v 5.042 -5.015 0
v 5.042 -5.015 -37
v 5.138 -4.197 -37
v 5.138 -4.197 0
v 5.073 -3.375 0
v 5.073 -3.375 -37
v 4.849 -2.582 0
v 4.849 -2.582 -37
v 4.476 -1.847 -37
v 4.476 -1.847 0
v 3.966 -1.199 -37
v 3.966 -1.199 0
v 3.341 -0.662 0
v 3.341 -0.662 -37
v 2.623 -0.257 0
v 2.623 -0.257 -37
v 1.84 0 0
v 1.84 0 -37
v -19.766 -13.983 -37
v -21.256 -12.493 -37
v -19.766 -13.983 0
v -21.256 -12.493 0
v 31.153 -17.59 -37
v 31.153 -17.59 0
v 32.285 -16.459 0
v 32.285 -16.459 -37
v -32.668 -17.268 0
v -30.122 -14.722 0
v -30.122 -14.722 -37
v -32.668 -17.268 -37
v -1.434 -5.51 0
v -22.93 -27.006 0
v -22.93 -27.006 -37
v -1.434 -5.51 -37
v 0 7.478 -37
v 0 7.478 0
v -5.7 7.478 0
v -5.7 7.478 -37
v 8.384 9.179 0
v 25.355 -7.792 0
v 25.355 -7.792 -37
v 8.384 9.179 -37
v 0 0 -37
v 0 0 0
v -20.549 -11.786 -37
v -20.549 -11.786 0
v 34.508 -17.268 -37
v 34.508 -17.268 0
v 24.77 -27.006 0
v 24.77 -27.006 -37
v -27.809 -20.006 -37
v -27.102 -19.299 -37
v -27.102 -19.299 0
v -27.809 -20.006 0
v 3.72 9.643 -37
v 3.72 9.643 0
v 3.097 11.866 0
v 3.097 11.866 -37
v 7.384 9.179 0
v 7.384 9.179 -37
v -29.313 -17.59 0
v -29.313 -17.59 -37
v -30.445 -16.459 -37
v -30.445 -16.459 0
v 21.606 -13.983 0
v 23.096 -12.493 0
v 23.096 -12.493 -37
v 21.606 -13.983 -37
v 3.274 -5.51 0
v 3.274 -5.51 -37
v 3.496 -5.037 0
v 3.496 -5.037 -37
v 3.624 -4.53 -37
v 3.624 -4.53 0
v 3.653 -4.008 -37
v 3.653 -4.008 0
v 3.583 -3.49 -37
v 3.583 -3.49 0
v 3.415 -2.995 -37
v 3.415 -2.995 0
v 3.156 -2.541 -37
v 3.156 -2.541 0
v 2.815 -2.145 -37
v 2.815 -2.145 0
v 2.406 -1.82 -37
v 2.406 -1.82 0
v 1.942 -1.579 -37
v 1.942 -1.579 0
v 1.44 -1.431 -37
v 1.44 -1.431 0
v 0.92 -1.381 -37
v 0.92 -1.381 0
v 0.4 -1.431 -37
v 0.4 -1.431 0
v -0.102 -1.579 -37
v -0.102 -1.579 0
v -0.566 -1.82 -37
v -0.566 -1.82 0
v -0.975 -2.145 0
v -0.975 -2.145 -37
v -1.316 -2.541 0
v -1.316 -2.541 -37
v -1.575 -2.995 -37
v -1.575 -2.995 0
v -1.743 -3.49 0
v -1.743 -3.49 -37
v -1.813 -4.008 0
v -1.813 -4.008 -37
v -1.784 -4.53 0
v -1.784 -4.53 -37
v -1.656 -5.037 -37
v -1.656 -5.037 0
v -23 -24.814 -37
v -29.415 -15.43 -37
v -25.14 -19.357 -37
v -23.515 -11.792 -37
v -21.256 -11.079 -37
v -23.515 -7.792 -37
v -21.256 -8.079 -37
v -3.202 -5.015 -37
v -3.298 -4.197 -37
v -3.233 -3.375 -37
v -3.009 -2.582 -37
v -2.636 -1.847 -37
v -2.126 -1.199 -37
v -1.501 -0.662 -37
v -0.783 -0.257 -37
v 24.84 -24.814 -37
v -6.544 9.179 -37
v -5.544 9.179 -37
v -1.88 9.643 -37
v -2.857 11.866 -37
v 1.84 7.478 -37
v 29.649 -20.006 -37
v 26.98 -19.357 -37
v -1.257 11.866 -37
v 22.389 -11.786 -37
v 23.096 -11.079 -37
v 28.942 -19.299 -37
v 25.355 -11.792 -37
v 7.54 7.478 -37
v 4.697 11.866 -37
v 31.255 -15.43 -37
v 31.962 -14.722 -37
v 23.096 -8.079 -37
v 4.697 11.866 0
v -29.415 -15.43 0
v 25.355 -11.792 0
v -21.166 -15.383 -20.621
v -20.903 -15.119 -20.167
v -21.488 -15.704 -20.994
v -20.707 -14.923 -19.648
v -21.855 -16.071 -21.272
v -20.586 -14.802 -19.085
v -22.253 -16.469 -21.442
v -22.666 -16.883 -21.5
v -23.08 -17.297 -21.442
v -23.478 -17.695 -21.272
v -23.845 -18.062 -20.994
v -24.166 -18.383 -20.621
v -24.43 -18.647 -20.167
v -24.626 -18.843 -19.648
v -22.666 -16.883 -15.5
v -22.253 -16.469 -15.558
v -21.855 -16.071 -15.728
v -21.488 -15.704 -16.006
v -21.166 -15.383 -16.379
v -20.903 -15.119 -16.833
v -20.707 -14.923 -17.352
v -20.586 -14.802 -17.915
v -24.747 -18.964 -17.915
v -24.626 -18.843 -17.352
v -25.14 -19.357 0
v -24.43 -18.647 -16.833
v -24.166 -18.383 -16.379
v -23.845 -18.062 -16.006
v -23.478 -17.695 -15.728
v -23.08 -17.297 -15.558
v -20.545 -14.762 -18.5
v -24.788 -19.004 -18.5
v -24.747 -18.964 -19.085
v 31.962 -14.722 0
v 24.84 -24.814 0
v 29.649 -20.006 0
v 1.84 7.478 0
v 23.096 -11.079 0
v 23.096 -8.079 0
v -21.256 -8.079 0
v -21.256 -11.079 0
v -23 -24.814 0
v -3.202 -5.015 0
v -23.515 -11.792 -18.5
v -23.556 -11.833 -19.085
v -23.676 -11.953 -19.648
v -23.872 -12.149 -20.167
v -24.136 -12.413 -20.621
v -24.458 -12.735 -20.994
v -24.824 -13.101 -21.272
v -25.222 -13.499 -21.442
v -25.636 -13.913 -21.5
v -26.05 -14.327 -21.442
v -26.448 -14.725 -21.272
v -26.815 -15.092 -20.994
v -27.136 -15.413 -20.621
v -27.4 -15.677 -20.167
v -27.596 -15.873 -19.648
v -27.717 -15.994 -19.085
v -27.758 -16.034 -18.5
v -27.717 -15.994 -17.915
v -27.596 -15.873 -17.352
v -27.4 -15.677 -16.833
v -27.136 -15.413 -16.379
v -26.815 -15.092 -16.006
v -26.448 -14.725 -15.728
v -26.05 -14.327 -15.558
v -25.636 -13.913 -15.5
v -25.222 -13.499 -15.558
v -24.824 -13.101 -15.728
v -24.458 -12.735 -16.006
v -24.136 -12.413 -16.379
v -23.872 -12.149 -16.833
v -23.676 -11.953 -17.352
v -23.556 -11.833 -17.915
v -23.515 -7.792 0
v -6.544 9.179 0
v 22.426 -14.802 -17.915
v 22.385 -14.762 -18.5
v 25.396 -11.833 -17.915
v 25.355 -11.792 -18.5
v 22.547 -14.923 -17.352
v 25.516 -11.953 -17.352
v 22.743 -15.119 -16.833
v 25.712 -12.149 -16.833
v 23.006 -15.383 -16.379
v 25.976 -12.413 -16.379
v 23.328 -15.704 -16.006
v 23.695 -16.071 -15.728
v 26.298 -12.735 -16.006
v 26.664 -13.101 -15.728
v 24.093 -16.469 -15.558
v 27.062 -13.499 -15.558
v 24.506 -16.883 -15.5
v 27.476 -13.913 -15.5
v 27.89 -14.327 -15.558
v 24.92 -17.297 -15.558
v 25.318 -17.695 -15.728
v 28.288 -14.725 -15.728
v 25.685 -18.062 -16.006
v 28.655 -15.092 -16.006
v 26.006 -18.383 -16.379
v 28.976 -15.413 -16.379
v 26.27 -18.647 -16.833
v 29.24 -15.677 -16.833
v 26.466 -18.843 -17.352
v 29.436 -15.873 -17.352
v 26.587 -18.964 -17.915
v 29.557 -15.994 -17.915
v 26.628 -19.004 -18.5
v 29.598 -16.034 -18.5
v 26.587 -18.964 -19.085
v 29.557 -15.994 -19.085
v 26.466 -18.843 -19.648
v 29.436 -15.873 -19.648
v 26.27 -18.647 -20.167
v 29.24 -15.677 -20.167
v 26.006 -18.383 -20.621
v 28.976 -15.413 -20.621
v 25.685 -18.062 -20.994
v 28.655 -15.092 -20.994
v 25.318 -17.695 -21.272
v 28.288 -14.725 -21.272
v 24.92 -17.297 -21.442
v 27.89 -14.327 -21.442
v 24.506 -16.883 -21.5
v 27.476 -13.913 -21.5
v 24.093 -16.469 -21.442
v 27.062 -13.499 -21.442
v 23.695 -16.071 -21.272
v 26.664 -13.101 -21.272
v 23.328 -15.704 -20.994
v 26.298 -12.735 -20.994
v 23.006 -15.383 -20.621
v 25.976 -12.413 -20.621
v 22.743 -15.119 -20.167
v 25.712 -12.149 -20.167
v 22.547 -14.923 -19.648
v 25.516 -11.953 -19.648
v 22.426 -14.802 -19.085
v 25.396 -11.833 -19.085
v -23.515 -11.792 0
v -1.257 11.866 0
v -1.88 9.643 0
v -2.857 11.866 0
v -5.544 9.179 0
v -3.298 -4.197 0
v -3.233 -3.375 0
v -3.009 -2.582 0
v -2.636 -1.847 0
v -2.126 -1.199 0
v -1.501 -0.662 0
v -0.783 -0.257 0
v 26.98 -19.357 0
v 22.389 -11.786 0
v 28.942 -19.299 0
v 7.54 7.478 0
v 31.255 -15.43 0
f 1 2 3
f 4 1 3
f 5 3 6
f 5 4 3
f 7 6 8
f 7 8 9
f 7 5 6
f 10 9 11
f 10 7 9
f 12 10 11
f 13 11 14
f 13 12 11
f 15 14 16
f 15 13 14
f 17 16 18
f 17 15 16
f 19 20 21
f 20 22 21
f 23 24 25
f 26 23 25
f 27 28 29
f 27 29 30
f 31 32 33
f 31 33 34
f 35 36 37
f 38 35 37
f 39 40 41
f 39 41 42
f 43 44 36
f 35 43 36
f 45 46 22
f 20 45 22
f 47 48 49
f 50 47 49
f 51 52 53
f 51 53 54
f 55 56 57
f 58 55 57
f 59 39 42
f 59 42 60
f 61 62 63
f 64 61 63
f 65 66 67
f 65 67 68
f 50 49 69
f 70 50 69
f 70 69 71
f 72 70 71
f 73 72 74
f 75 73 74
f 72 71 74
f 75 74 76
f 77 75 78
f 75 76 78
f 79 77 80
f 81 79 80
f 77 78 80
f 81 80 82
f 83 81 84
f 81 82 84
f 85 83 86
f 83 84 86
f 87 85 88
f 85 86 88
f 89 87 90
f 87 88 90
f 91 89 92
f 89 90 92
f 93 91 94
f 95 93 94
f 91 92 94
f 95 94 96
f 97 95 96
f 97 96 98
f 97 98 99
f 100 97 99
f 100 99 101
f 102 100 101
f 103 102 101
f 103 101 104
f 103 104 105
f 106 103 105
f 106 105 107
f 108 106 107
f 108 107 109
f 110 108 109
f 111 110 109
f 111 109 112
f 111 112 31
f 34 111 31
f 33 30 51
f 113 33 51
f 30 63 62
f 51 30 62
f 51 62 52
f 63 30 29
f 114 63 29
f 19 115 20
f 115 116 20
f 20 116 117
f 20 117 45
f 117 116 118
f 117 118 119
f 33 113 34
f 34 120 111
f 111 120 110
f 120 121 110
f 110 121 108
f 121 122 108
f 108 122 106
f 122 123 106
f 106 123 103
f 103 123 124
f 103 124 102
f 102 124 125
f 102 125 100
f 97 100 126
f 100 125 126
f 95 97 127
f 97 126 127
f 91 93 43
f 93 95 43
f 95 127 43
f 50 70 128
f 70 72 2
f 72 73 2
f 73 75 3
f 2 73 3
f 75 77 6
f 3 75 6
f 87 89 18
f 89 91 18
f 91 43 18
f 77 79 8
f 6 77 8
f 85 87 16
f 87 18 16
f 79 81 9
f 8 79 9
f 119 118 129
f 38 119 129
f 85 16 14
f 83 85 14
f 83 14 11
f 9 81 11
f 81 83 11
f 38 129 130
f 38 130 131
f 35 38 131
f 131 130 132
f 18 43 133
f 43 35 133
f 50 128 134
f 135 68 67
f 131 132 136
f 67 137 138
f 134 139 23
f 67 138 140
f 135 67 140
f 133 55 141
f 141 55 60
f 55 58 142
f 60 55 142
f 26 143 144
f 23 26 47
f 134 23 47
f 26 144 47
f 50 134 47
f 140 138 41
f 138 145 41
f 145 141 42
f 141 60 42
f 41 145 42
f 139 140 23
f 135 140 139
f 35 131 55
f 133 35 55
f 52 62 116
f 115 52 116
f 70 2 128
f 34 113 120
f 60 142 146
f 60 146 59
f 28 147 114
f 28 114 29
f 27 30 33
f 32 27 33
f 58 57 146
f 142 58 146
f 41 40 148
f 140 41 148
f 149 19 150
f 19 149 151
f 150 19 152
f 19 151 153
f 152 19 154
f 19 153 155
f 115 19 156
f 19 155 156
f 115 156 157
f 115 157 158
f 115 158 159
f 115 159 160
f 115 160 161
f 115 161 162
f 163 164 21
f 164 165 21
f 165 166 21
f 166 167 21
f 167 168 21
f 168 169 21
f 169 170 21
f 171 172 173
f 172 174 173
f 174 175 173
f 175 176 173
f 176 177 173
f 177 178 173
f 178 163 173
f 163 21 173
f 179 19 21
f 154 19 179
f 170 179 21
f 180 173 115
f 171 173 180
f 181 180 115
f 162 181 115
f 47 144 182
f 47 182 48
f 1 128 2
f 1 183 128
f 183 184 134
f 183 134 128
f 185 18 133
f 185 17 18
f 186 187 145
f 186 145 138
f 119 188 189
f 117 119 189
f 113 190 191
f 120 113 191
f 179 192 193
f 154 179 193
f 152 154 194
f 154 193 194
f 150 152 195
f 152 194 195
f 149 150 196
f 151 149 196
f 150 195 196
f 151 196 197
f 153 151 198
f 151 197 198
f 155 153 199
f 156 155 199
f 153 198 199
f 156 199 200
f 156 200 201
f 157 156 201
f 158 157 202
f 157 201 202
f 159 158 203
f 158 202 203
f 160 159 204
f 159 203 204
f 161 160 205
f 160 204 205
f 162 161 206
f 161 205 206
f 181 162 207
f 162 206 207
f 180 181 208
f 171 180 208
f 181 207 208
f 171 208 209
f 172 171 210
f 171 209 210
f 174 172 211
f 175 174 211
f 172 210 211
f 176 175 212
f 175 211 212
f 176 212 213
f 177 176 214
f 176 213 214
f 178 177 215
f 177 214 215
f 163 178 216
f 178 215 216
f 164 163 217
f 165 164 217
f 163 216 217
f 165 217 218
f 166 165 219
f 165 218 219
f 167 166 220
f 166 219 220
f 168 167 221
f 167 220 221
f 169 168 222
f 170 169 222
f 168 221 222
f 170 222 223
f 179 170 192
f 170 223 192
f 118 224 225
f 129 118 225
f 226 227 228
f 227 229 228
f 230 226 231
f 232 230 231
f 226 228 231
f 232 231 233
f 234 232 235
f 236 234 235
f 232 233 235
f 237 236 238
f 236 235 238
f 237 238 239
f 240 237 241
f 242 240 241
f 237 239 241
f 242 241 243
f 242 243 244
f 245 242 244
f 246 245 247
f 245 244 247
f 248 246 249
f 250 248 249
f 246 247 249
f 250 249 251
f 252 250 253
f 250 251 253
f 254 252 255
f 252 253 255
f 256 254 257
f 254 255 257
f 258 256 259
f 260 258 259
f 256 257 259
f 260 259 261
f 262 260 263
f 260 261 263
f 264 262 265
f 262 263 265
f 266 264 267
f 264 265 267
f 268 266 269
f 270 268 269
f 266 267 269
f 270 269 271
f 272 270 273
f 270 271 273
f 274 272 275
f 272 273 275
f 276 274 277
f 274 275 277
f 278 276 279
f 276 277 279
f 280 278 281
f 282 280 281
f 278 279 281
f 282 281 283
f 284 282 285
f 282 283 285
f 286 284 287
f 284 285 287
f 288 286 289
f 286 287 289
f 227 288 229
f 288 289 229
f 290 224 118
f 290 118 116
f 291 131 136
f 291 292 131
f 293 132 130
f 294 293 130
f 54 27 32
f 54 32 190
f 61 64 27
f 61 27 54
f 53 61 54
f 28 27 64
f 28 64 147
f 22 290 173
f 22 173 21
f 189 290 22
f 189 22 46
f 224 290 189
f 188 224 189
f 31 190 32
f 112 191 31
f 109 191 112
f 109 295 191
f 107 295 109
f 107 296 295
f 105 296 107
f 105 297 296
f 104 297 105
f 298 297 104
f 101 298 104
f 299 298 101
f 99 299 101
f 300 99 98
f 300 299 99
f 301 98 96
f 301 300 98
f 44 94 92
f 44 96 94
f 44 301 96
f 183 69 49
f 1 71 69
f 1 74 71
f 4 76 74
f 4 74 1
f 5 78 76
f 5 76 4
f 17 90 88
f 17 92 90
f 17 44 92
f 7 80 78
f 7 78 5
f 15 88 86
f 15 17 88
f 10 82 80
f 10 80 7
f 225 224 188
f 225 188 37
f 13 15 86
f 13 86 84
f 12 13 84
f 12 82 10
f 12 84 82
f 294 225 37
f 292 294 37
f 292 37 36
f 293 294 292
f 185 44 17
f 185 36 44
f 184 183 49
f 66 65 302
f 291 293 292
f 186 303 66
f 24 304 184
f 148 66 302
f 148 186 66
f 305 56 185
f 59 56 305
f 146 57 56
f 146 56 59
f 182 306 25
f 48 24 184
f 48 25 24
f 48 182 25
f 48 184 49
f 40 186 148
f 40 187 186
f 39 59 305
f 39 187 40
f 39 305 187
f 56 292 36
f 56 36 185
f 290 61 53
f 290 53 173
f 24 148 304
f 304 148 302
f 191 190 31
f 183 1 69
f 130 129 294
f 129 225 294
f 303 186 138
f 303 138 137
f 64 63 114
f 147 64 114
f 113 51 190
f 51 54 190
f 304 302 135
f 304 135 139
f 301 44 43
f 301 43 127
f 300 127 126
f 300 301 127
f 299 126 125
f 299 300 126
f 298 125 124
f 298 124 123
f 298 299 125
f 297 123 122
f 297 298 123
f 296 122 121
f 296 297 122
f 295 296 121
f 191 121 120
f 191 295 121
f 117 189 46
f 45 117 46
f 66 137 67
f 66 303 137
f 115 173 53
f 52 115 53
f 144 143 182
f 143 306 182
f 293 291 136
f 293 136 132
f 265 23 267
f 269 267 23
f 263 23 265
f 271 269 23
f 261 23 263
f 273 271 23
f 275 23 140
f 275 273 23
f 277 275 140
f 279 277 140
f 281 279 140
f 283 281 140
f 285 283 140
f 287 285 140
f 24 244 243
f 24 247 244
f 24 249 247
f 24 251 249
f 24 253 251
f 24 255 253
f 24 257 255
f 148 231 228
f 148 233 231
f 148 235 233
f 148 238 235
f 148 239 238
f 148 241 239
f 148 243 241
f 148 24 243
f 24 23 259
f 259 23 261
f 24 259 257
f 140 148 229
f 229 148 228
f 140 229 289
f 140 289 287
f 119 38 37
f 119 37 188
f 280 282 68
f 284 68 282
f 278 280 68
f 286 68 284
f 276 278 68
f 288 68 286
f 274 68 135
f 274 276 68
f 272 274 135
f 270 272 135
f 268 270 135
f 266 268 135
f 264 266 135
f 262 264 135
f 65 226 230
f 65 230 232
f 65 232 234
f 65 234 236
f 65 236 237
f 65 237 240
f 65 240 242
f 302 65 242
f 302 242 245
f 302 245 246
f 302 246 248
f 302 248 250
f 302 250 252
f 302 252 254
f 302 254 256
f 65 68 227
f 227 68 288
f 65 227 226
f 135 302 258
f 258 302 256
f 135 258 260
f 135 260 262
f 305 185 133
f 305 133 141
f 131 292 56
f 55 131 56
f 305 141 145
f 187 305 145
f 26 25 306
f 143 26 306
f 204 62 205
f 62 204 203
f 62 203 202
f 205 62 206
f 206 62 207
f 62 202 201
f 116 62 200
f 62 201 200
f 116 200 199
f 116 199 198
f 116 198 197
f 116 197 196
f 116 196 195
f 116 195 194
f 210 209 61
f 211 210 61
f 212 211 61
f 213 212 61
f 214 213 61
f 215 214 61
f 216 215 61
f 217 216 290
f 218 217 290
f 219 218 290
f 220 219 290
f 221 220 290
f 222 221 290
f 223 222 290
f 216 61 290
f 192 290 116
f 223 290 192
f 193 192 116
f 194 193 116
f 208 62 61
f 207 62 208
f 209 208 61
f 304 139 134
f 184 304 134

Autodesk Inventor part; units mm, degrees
ref_plane "YZ Plane" through (0, 0, 0) normal (1, 0, 0) x (0, 1, 0)
sketch "Sketch1" plane through (0, 0, 0) normal (0, 0, 1) x (1, 0, 0)
  line L0 (0, 0) -> (0, 7.4776)
  line L1 (0, 7.4776) -> (-5.7, 7.4776)
  line L2 (-5.7, 7.4776) -> (-21.2563, -8.0788)
  line L3 (-21.2563, -8.0788) -> (-21.2563, -11.0788)
  line L4 (-21.2563, -11.0788) -> (-20.5492, -11.7859)
  line L5 (-20.5492, -11.7859) -> (-21.2563, -12.493)
  line L6 (-21.2563, -12.493) -> (-19.7664, -13.983)
  line L7 (-19.7664, -13.983) -> (-25.1404, -19.357)
  line L8 (-25.1404, -19.357) -> (-27.1017, -19.2987)
  line L9 (-27.1017, -19.2987) -> (-27.8088, -20.0059)
  line L10 (-27.8088, -20.0059) -> (-23.0005, -24.8142)
  line L11 (-23.0005, -24.8142) -> (-3.2015, -5.0152)
  line L12 (-1.88, 9.6426) -> (-1.2574, 11.8658)
  line L13 (-1.2574, 11.8658) -> (-2.8574, 11.8658)
  line L14 (-2.8574, 11.8658) -> (-5.5444, 9.1788)
  line L15 (-23.5149, -7.7918) -> (-6.5444, 9.1788)
  line L16 (-6.5444, 9.1788) -> (-5.5444, 9.1788)
  line L17 (-23.5149, -7.7918) -> (-23.5149, -11.7918)
  line L18 (-29.3132, -17.5901) -> (-23.5149, -11.7918)
  line L19 (-29.3132, -17.5901) -> (-30.4446, -16.4587)
  line L20 (-30.4446, -16.4587) -> (-29.4153, -15.4295)
  line L21 (-29.4153, -15.4295) -> (-30.1224, -14.7223)
  line L22 (-30.1224, -14.7223) -> (-32.668, -17.2679)
  line L23 (-32.668, -17.2679) -> (-22.9298, -27.0062)
  line L24 (-22.9298, -27.0062) -> (-1.4337, -5.5102)
  line L25 (0.92, 16.812) -> (0.92, -19.9546) construction
  line L26 (1.84, 0) -> (1.84, 7.4776)
  line L27 (1.84, 7.4776) -> (7.54, 7.4776)
  line L28 (7.54, 7.4776) -> (23.0963, -8.0788)
  line L29 (23.0963, -8.0788) -> (23.0963, -11.0788)
  line L30 (23.0963, -11.0788) -> (22.3892, -11.7859)
  line L31 (22.3892, -11.7859) -> (23.0963, -12.493)
  line L32 (23.0963, -12.493) -> (21.6064, -13.983)
  line L33 (21.6064, -13.983) -> (26.9804, -19.357)
  line L34 (26.9804, -19.357) -> (28.9417, -19.2987)
  line L35 (28.9417, -19.2987) -> (29.6488, -20.0059)
  line L36 (29.6488, -20.0059) -> (24.8405, -24.8142)
  line L37 (24.8405, -24.8142) -> (5.0415, -5.0152)
  line L38 (3.72, 9.6426) -> (3.0974, 11.8658)
  line L39 (3.0974, 11.8658) -> (4.6974, 11.8658)
  line L40 (4.6974, 11.8658) -> (7.3844, 9.1788)
  line L41 (25.3549, -7.7918) -> (8.3844, 9.1788)
  line L42 (8.3844, 9.1788) -> (7.3844, 9.1788)
  line L43 (25.3549, -7.7918) -> (25.3549, -11.7918)
  line L44 (31.1532, -17.5901) -> (25.3549, -11.7918)
  line L45 (31.1532, -17.5901) -> (32.2846, -16.4587)
  line L46 (32.2846, -16.4587) -> (31.2553, -15.4295)
  line L47 (31.2553, -15.4295) -> (31.9624, -14.7223)
  line L48 (31.9624, -14.7223) -> (34.508, -17.2679)
  line L49 (34.508, -17.2679) -> (24.7698, -27.0062)
  line L50 (24.7698, -27.0062) -> (3.2737, -5.5102)
  line L51 (-1.88, 9.6426) -> (3.72, 9.6426)
  arc A0 (3.2737, -5.5102) -> (-1.4337, -5.5102) centre (0.92, -4.1167) ccw
  arc A1 (5.0415, -5.0152) -> (1.84, 0) centre (0.92, -4.1167) ccw
  arc A2 (0, 0) -> (-3.2015, -5.0152) centre (0.92, -4.1167) ccw
  point P0 (-22.4534, -16.67)
  dimension "d1" = 5.7
  dimension "d2" = 135
  dimension "d3" = 22
  dimension "d13" = 3
  dimension "d14" = 28
  dimension "d22" = 1.6
  dimension "d23" = 3.8
  dimension "d24" = 1
  dimension "d25" = 24
  dimension "d30" = 4
  dimension "d34" = 3.6
  dimension "d36" = 1.5
  dimension "d38" = 1.6
  dimension "d47" = 1.84
  dimension "d55" = 8.2
  dimension "d56" = 1.6
  dimension "d57" = 1
  dimension "d59" = 7.6
  dimension "d61" = 1
  dimension "d62" = 6.8
  dimension "d72" = 30.4
  dimension "d74" = 13.772
  dimension "d75" = 4.2
  dimension "d76" = 5.6
  dimension "d77" = 1.8
  dimension "d78" = 1
  dimension "d80" = 90
  dimension "d81" = 7.4776
extrude "Extrusion1" add sketch "Sketch1" against normal blind 37
ref_plane "Work Plane2" through (31.1532, -17.5901, -37) normal (0.7071, 0.7071, 0) x (-0.7071, 0.7071, 0)
sketch "Sketch3" plane through (31.1532, -17.5901, -37) normal (0.7071, 0.7071, 0) x (-0.7071, 0.7071, 0)
  circle A0 centre (5.2, 18.5) radius 3
  line L0 (0, 37) -> (8.2, 37) projected
  line L1 (8.2, 37) -> (8.2, 0) projected
  point P0 (34.4667, 37)
  dimension "d65" = 18.5
  dimension "d67" = 6
extrude "Extrusion2" cut sketch "Sketch3" against normal blind 6
thread "Thread1" size "M6x1" class "6H" standard "ANSI Metric M Profile" full length
ref_plane "Work Plane4" through (0.92, 19.6401, -37) normal (-1, 0, 0) x (0, 0, -1)
mirror "Mirror2" about plane through (0.92, 19.6401, -37) normal (-1, 0, 0) of "Extrusion2"
properties part number "ESCUADRA"
